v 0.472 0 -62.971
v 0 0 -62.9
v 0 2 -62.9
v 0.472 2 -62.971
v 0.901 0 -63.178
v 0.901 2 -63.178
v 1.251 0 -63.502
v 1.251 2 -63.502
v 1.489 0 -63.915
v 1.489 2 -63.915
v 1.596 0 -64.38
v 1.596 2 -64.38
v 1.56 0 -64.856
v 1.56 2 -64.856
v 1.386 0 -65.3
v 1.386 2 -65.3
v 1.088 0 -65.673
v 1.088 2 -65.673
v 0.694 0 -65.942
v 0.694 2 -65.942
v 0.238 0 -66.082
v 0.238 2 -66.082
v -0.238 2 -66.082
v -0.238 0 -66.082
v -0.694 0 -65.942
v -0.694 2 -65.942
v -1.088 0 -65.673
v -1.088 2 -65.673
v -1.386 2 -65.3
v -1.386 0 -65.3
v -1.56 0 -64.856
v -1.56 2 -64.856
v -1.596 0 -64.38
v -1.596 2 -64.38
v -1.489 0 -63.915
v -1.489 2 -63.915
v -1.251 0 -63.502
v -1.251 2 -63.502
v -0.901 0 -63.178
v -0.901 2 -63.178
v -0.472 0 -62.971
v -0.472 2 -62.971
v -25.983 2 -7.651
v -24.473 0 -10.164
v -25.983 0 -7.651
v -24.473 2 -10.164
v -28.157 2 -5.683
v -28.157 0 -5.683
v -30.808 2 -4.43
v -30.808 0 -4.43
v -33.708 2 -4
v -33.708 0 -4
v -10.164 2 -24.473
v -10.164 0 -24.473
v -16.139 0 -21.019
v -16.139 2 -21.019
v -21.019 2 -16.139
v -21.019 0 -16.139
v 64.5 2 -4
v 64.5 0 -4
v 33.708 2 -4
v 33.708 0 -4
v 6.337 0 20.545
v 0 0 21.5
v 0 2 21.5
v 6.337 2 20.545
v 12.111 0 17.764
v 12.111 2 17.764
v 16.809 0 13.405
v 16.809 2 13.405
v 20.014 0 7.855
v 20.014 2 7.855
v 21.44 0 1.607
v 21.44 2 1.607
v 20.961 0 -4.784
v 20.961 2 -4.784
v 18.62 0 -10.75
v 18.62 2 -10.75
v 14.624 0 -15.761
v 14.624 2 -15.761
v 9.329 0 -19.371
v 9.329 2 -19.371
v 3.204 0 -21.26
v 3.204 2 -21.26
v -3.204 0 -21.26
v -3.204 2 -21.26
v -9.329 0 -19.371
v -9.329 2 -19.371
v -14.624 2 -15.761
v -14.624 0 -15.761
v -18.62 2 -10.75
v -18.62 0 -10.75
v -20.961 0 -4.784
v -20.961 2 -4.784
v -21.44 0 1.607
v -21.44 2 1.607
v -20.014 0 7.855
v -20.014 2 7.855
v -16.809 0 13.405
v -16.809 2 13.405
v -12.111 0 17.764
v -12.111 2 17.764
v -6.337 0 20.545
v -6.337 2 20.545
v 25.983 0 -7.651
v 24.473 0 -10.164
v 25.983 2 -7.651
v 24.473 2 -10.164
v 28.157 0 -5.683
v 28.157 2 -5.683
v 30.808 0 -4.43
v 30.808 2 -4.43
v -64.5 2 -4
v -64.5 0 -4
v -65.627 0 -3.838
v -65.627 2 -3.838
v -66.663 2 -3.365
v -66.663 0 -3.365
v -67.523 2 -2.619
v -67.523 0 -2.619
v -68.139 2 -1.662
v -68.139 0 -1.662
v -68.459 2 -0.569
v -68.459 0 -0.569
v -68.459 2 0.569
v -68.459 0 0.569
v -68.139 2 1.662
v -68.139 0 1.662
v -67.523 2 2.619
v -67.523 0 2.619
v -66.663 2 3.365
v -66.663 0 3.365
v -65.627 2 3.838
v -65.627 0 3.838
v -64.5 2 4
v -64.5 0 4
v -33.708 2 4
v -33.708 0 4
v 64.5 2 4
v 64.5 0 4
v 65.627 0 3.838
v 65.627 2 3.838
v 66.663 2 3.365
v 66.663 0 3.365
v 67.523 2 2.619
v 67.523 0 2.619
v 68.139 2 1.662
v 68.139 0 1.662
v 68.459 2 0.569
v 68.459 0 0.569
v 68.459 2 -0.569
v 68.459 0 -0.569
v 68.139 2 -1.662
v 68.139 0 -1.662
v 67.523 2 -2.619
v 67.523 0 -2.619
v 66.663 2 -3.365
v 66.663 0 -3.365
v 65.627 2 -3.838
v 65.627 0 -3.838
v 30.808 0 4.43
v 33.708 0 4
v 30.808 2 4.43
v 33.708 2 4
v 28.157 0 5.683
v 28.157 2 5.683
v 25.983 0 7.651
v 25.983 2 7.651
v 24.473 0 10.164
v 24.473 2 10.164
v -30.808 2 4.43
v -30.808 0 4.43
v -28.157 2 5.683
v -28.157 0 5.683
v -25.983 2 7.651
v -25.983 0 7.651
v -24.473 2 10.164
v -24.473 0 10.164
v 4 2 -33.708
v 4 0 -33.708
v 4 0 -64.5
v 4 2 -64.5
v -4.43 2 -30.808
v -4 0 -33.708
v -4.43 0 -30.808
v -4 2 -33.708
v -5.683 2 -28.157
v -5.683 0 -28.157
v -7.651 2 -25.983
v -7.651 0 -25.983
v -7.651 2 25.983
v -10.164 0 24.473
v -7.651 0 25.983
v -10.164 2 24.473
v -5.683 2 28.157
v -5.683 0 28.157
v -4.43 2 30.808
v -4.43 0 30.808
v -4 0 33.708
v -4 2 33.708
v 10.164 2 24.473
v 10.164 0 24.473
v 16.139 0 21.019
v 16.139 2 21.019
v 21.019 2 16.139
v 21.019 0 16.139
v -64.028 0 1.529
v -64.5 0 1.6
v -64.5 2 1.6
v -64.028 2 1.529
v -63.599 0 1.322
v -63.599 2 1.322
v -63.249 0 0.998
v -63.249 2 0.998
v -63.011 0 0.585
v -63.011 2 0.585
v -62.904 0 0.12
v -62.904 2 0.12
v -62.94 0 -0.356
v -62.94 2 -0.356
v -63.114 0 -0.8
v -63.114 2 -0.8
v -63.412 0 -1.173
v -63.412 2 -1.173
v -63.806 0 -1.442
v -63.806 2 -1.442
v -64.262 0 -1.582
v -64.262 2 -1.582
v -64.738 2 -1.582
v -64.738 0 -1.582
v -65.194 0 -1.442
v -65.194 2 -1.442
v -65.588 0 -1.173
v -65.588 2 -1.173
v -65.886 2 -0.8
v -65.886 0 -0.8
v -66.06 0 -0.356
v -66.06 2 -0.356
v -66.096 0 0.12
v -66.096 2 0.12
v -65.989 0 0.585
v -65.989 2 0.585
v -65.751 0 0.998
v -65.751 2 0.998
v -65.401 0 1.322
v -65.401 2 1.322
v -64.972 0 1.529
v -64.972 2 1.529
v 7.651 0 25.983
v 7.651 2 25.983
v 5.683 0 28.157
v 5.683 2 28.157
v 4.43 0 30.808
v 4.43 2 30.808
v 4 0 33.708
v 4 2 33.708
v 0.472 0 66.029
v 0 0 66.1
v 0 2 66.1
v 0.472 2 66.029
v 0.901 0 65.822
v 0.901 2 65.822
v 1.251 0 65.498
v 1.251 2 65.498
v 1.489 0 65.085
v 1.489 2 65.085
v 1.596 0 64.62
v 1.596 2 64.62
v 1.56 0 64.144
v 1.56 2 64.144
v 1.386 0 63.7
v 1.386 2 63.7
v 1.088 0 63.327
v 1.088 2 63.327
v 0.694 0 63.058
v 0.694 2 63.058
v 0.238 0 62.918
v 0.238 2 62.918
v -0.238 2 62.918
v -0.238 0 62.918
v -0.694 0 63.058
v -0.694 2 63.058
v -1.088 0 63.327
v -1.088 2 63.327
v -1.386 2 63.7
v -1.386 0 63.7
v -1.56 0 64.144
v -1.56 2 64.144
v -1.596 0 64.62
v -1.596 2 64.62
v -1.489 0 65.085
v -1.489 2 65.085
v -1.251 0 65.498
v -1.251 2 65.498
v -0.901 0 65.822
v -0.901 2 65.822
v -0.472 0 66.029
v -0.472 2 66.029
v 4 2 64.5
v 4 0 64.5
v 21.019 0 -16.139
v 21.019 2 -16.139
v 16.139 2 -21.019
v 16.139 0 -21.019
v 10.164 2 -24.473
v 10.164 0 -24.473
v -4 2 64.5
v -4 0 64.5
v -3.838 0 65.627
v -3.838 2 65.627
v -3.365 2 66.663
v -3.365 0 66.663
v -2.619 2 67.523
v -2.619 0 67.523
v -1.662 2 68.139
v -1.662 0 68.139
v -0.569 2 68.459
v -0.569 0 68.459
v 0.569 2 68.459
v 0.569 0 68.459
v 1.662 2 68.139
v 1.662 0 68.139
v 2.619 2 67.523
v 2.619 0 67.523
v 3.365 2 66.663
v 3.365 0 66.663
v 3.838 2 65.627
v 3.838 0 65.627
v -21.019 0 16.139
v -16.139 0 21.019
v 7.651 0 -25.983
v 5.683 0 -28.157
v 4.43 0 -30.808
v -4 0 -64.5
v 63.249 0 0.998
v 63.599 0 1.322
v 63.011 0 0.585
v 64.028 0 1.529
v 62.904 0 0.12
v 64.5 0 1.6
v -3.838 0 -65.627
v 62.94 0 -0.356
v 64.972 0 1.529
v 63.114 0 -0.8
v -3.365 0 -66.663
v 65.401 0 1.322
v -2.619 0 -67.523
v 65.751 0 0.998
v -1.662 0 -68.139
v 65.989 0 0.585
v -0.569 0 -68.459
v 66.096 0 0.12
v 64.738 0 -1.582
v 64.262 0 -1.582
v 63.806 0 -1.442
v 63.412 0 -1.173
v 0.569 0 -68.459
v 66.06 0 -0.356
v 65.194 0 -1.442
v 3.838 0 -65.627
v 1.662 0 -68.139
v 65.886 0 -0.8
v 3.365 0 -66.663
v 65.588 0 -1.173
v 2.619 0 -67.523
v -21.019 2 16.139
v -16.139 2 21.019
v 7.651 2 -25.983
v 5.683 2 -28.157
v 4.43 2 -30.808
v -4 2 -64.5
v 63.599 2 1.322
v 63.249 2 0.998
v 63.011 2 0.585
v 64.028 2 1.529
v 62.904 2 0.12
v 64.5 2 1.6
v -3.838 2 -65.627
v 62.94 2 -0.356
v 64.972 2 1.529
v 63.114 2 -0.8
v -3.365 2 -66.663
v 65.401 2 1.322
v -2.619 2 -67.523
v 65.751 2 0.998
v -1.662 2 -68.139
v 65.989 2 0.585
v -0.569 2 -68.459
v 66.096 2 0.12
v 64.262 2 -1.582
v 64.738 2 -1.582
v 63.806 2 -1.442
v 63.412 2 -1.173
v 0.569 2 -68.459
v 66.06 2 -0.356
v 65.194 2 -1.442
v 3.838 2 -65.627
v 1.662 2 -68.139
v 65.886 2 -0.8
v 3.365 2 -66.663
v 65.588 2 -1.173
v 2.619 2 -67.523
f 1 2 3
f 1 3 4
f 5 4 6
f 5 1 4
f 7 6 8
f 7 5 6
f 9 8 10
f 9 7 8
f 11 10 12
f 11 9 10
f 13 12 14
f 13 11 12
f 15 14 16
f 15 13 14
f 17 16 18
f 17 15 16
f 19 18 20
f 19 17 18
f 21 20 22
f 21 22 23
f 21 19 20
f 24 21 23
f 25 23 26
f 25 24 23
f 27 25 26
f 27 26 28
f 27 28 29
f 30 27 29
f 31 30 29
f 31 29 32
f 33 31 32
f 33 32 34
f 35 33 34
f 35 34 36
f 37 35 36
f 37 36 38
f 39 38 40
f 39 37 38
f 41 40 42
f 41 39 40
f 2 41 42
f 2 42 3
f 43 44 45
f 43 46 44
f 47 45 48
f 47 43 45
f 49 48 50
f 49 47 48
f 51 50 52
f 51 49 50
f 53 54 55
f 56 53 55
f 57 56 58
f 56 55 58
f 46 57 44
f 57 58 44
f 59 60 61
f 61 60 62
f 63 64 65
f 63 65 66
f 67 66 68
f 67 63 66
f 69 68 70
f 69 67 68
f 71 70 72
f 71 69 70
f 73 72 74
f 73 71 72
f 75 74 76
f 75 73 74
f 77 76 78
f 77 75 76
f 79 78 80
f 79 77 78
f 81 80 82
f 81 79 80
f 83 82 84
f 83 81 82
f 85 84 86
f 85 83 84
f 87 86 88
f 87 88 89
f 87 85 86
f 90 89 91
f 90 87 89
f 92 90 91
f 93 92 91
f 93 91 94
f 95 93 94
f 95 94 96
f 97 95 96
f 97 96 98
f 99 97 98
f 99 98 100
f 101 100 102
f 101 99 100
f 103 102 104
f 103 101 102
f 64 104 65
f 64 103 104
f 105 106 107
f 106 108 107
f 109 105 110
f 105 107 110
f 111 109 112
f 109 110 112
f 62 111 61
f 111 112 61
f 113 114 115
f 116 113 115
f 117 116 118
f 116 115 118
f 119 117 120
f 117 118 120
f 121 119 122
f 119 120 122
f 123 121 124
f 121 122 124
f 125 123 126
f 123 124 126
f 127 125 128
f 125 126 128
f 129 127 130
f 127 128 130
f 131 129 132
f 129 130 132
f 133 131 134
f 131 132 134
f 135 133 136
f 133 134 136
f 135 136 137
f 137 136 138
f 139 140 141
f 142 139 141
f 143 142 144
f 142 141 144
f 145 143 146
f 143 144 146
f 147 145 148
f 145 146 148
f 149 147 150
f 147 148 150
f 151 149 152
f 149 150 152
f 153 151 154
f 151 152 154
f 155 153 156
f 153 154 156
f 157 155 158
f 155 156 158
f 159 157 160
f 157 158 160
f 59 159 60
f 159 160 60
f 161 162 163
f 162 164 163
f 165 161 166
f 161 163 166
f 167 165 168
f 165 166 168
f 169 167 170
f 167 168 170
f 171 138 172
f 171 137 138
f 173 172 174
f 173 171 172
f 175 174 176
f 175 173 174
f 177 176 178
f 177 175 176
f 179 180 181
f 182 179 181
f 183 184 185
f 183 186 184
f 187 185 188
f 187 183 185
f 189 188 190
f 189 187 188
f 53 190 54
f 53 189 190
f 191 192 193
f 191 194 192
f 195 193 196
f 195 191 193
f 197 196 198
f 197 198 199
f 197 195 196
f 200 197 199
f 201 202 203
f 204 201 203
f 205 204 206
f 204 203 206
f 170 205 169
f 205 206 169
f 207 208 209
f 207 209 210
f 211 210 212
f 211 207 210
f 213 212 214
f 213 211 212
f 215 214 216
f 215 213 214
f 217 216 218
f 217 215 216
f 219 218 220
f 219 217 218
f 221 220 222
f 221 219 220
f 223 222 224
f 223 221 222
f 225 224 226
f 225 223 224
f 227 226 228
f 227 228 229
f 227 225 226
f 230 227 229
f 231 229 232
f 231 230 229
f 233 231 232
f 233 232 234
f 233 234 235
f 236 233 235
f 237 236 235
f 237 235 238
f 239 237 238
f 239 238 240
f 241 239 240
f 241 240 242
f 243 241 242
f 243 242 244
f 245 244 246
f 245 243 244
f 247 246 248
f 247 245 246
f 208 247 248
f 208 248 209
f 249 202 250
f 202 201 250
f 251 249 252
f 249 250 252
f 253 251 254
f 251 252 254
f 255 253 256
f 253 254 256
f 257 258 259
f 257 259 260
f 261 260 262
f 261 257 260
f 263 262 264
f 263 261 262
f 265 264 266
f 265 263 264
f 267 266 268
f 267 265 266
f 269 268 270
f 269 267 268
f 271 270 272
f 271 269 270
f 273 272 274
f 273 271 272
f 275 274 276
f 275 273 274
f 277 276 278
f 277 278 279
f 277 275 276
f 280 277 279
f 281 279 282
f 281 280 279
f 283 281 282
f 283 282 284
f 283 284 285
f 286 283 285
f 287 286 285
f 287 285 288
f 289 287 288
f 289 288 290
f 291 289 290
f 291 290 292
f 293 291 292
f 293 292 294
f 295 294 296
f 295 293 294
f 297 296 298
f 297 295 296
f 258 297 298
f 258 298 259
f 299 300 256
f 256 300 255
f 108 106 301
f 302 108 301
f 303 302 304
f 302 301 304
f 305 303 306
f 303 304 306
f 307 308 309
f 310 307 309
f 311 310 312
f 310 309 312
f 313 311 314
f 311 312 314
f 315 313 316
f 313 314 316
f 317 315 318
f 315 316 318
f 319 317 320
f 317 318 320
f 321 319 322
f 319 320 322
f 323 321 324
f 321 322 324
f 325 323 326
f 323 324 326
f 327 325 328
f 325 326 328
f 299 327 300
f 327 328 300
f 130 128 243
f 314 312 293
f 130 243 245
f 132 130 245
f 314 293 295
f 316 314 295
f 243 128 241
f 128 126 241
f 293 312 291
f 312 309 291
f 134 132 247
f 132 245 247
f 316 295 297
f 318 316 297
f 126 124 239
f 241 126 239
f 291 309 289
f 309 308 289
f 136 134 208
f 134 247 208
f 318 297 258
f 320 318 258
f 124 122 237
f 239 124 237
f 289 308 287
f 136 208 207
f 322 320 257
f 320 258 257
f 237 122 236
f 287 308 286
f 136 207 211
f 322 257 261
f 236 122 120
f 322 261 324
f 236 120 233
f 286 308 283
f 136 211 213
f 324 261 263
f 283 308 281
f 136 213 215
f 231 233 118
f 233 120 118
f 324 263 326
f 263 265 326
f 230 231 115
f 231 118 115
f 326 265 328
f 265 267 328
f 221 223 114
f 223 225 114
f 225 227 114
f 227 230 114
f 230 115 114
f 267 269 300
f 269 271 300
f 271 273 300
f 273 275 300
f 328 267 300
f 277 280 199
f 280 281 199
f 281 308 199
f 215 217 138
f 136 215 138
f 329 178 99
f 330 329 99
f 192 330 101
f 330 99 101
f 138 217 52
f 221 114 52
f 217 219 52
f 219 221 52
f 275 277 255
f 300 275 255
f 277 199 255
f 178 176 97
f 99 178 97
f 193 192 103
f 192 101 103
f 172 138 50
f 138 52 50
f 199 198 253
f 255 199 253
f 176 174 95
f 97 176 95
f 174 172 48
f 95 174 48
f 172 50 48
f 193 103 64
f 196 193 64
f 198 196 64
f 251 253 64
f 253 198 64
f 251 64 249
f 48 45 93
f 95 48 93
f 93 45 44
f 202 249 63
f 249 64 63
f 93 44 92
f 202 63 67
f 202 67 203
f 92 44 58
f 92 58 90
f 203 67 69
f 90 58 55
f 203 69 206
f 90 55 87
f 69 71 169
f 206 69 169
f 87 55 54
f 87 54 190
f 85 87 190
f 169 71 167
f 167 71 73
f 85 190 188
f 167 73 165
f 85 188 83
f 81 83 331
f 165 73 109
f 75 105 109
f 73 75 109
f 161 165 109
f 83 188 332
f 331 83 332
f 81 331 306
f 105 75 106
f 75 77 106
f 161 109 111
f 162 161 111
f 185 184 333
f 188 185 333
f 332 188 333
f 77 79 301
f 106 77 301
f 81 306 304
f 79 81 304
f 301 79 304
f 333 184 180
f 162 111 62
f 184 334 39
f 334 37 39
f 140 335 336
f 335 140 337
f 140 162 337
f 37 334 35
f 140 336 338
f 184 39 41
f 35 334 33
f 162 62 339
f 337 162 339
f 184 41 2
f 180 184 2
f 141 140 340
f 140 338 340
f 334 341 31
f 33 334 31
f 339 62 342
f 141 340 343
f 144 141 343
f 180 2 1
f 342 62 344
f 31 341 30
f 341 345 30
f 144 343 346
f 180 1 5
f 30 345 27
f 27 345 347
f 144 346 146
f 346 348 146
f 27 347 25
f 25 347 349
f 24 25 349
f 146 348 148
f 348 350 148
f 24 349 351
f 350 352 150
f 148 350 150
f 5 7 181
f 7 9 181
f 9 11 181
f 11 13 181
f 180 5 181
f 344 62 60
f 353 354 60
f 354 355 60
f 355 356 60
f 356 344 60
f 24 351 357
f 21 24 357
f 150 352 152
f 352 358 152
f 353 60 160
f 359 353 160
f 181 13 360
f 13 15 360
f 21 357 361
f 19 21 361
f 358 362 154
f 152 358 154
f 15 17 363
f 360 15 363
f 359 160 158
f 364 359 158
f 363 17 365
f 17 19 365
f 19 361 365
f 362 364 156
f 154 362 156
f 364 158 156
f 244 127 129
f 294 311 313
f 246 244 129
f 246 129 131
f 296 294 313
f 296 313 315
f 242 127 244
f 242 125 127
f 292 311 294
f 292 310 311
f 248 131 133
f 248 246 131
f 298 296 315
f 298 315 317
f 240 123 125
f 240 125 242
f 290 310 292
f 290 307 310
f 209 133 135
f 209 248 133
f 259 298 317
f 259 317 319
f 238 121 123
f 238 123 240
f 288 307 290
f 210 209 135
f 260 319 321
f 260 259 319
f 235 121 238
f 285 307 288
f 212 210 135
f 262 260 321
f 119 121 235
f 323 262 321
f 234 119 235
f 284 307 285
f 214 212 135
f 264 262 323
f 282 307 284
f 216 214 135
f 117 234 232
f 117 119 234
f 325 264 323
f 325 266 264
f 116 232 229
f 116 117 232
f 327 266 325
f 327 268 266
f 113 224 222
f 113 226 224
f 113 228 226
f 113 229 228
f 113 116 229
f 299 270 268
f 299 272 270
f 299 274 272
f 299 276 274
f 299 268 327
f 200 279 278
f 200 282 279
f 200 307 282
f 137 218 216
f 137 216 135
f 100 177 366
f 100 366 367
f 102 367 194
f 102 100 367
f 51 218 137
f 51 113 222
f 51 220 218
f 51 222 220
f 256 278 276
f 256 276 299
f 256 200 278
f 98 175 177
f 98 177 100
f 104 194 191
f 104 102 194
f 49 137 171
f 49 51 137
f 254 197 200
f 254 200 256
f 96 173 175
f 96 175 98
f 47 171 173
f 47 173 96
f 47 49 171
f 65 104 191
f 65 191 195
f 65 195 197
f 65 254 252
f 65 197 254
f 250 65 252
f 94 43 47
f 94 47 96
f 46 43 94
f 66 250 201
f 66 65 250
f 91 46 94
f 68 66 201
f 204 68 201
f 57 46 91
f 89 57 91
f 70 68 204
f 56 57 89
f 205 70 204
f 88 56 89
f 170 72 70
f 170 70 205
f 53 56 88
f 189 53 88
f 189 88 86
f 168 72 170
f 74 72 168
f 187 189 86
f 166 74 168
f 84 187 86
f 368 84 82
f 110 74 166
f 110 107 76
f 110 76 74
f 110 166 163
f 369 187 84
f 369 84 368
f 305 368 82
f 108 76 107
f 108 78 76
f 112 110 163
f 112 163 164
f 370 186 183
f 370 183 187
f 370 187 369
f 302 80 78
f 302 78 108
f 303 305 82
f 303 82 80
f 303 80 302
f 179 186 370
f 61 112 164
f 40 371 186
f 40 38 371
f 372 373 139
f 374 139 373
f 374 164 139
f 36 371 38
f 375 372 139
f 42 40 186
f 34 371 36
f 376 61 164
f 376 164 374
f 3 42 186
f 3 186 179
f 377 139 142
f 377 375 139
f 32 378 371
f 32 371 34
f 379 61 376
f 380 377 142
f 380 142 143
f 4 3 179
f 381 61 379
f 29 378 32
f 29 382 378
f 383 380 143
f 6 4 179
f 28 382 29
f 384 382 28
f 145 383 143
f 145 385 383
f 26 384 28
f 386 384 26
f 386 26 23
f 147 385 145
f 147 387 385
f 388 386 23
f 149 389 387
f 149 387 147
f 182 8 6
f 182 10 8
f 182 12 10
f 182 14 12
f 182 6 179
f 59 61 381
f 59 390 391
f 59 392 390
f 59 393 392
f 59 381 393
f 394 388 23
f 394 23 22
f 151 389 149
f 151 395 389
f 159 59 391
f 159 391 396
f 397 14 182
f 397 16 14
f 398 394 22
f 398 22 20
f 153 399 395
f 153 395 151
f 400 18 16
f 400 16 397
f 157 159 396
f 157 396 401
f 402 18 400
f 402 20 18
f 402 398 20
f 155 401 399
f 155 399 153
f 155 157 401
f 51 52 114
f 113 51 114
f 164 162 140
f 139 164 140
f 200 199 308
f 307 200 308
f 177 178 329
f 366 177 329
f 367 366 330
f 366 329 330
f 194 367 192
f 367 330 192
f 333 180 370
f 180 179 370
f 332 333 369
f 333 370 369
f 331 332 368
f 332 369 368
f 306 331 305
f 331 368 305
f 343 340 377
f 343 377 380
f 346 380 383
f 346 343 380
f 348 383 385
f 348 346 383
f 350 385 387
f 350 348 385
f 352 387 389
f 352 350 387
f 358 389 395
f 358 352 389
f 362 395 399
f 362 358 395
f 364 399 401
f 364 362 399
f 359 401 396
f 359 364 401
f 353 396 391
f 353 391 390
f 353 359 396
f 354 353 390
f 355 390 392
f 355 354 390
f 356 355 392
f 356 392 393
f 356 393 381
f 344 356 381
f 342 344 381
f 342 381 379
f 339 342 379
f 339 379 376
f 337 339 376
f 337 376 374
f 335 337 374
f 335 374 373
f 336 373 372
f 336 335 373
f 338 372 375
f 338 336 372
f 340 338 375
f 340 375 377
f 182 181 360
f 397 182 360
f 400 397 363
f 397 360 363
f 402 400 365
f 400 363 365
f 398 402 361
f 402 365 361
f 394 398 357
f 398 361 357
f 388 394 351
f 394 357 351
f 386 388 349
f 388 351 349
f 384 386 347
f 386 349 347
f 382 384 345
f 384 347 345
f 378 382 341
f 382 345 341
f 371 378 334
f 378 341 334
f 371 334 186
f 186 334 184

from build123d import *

# Parameters (mm, degrees)
SKETCH1_R           = 21.5
SKETCH1_R_2         = 1.6
BOSS_EXTRUDE1_DEPTH = 2
FILLET1_R           = 10


with BuildPart() as part:
    # Sketch1 → Boss-Extrude1 (new body)
    with BuildSketch(Plane(origin=(0, 0, 0), x_dir=(1, 0, 0), z_dir=(0, 1, 0))):
        with BuildLine():
            Line((4, 26.196373795), (4, 64.5))
            ThreePointArc((4, 64.5), (0, 68.5), (-4, 64.5))
            Line((-4, 64.5), (-4, 26.196373795))
            ThreePointArc((-4, 26.196373795), (-18.738329701, 18.738329701), (-26.196373795, 4))
            Line((-26.196373795, 4), (-64.5, 4))
            ThreePointArc((-64.5, 4), (-68.5, 0), (-64.5, -4))
            Line((-64.5, -4), (-26.196373795, -4))
            ThreePointArc((-26.196373795, -4), (-18.738329701, -18.738329701), (-4, -26.196373795))
            Line((-4, -26.196373795), (-4, -64.5))
            ThreePointArc((-4, -64.5), (0, -68.5), (4, -64.5))
            Line((4, -64.5), (4, -26.196373795))
            ThreePointArc((4, -26.196373795), (18.738329701, -18.738329701), (26.196373795, -4))
            Line((26.196373795, -4), (64.5, -4))
            ThreePointArc((64.5, -4), (68.5, 0), (64.5, 4))
            Line((64.5, 4), (26.196373795, 4))
            ThreePointArc((26.196373795, 4), (18.738329701, 18.738329701), (4, 26.196373795))
        make_face()
        with Locations(Location((0, 0, 0), (0, 0, 270))):
            Circle(SKETCH1_R, mode=Mode.SUBTRACT)
        with Locations(Location((0, 64.5, 0), (0, 0, 270))):
            Circle(SKETCH1_R_2, mode=Mode.SUBTRACT)
        with Locations(Location((64.5, 0, 0), (0, 0, 270))):
            Circle(SKETCH1_R_2, mode=Mode.SUBTRACT)
        with Locations(Location((0, -64.5, 0), (0, 0, 270))):
            Circle(SKETCH1_R_2, mode=Mode.SUBTRACT)
        with Locations(Location((-64.5, 0, 0), (0, 0, 270))):
            Circle(SKETCH1_R_2, mode=Mode.SUBTRACT)
    extrude(amount=BOSS_EXTRUDE1_DEPTH)

    # Fillet1
    fillet1_edges = [part.edges().sort_by_distance(p)[0] for p in [
        (26.196373795, 1, -4),
        (26.196373795, 1, 4),
        (4, 1, 26.196373795),
        (-4, 1, 26.196373795),
        (-26.196373795, 1, 4),
        (-26.196373795, 1, -4),
        (-4, 1, -26.196373795),
        (4, 1, -26.196373795),
    ]]
    fillet(fillet1_edges, radius=FILLET1_R)


solid = part.part
